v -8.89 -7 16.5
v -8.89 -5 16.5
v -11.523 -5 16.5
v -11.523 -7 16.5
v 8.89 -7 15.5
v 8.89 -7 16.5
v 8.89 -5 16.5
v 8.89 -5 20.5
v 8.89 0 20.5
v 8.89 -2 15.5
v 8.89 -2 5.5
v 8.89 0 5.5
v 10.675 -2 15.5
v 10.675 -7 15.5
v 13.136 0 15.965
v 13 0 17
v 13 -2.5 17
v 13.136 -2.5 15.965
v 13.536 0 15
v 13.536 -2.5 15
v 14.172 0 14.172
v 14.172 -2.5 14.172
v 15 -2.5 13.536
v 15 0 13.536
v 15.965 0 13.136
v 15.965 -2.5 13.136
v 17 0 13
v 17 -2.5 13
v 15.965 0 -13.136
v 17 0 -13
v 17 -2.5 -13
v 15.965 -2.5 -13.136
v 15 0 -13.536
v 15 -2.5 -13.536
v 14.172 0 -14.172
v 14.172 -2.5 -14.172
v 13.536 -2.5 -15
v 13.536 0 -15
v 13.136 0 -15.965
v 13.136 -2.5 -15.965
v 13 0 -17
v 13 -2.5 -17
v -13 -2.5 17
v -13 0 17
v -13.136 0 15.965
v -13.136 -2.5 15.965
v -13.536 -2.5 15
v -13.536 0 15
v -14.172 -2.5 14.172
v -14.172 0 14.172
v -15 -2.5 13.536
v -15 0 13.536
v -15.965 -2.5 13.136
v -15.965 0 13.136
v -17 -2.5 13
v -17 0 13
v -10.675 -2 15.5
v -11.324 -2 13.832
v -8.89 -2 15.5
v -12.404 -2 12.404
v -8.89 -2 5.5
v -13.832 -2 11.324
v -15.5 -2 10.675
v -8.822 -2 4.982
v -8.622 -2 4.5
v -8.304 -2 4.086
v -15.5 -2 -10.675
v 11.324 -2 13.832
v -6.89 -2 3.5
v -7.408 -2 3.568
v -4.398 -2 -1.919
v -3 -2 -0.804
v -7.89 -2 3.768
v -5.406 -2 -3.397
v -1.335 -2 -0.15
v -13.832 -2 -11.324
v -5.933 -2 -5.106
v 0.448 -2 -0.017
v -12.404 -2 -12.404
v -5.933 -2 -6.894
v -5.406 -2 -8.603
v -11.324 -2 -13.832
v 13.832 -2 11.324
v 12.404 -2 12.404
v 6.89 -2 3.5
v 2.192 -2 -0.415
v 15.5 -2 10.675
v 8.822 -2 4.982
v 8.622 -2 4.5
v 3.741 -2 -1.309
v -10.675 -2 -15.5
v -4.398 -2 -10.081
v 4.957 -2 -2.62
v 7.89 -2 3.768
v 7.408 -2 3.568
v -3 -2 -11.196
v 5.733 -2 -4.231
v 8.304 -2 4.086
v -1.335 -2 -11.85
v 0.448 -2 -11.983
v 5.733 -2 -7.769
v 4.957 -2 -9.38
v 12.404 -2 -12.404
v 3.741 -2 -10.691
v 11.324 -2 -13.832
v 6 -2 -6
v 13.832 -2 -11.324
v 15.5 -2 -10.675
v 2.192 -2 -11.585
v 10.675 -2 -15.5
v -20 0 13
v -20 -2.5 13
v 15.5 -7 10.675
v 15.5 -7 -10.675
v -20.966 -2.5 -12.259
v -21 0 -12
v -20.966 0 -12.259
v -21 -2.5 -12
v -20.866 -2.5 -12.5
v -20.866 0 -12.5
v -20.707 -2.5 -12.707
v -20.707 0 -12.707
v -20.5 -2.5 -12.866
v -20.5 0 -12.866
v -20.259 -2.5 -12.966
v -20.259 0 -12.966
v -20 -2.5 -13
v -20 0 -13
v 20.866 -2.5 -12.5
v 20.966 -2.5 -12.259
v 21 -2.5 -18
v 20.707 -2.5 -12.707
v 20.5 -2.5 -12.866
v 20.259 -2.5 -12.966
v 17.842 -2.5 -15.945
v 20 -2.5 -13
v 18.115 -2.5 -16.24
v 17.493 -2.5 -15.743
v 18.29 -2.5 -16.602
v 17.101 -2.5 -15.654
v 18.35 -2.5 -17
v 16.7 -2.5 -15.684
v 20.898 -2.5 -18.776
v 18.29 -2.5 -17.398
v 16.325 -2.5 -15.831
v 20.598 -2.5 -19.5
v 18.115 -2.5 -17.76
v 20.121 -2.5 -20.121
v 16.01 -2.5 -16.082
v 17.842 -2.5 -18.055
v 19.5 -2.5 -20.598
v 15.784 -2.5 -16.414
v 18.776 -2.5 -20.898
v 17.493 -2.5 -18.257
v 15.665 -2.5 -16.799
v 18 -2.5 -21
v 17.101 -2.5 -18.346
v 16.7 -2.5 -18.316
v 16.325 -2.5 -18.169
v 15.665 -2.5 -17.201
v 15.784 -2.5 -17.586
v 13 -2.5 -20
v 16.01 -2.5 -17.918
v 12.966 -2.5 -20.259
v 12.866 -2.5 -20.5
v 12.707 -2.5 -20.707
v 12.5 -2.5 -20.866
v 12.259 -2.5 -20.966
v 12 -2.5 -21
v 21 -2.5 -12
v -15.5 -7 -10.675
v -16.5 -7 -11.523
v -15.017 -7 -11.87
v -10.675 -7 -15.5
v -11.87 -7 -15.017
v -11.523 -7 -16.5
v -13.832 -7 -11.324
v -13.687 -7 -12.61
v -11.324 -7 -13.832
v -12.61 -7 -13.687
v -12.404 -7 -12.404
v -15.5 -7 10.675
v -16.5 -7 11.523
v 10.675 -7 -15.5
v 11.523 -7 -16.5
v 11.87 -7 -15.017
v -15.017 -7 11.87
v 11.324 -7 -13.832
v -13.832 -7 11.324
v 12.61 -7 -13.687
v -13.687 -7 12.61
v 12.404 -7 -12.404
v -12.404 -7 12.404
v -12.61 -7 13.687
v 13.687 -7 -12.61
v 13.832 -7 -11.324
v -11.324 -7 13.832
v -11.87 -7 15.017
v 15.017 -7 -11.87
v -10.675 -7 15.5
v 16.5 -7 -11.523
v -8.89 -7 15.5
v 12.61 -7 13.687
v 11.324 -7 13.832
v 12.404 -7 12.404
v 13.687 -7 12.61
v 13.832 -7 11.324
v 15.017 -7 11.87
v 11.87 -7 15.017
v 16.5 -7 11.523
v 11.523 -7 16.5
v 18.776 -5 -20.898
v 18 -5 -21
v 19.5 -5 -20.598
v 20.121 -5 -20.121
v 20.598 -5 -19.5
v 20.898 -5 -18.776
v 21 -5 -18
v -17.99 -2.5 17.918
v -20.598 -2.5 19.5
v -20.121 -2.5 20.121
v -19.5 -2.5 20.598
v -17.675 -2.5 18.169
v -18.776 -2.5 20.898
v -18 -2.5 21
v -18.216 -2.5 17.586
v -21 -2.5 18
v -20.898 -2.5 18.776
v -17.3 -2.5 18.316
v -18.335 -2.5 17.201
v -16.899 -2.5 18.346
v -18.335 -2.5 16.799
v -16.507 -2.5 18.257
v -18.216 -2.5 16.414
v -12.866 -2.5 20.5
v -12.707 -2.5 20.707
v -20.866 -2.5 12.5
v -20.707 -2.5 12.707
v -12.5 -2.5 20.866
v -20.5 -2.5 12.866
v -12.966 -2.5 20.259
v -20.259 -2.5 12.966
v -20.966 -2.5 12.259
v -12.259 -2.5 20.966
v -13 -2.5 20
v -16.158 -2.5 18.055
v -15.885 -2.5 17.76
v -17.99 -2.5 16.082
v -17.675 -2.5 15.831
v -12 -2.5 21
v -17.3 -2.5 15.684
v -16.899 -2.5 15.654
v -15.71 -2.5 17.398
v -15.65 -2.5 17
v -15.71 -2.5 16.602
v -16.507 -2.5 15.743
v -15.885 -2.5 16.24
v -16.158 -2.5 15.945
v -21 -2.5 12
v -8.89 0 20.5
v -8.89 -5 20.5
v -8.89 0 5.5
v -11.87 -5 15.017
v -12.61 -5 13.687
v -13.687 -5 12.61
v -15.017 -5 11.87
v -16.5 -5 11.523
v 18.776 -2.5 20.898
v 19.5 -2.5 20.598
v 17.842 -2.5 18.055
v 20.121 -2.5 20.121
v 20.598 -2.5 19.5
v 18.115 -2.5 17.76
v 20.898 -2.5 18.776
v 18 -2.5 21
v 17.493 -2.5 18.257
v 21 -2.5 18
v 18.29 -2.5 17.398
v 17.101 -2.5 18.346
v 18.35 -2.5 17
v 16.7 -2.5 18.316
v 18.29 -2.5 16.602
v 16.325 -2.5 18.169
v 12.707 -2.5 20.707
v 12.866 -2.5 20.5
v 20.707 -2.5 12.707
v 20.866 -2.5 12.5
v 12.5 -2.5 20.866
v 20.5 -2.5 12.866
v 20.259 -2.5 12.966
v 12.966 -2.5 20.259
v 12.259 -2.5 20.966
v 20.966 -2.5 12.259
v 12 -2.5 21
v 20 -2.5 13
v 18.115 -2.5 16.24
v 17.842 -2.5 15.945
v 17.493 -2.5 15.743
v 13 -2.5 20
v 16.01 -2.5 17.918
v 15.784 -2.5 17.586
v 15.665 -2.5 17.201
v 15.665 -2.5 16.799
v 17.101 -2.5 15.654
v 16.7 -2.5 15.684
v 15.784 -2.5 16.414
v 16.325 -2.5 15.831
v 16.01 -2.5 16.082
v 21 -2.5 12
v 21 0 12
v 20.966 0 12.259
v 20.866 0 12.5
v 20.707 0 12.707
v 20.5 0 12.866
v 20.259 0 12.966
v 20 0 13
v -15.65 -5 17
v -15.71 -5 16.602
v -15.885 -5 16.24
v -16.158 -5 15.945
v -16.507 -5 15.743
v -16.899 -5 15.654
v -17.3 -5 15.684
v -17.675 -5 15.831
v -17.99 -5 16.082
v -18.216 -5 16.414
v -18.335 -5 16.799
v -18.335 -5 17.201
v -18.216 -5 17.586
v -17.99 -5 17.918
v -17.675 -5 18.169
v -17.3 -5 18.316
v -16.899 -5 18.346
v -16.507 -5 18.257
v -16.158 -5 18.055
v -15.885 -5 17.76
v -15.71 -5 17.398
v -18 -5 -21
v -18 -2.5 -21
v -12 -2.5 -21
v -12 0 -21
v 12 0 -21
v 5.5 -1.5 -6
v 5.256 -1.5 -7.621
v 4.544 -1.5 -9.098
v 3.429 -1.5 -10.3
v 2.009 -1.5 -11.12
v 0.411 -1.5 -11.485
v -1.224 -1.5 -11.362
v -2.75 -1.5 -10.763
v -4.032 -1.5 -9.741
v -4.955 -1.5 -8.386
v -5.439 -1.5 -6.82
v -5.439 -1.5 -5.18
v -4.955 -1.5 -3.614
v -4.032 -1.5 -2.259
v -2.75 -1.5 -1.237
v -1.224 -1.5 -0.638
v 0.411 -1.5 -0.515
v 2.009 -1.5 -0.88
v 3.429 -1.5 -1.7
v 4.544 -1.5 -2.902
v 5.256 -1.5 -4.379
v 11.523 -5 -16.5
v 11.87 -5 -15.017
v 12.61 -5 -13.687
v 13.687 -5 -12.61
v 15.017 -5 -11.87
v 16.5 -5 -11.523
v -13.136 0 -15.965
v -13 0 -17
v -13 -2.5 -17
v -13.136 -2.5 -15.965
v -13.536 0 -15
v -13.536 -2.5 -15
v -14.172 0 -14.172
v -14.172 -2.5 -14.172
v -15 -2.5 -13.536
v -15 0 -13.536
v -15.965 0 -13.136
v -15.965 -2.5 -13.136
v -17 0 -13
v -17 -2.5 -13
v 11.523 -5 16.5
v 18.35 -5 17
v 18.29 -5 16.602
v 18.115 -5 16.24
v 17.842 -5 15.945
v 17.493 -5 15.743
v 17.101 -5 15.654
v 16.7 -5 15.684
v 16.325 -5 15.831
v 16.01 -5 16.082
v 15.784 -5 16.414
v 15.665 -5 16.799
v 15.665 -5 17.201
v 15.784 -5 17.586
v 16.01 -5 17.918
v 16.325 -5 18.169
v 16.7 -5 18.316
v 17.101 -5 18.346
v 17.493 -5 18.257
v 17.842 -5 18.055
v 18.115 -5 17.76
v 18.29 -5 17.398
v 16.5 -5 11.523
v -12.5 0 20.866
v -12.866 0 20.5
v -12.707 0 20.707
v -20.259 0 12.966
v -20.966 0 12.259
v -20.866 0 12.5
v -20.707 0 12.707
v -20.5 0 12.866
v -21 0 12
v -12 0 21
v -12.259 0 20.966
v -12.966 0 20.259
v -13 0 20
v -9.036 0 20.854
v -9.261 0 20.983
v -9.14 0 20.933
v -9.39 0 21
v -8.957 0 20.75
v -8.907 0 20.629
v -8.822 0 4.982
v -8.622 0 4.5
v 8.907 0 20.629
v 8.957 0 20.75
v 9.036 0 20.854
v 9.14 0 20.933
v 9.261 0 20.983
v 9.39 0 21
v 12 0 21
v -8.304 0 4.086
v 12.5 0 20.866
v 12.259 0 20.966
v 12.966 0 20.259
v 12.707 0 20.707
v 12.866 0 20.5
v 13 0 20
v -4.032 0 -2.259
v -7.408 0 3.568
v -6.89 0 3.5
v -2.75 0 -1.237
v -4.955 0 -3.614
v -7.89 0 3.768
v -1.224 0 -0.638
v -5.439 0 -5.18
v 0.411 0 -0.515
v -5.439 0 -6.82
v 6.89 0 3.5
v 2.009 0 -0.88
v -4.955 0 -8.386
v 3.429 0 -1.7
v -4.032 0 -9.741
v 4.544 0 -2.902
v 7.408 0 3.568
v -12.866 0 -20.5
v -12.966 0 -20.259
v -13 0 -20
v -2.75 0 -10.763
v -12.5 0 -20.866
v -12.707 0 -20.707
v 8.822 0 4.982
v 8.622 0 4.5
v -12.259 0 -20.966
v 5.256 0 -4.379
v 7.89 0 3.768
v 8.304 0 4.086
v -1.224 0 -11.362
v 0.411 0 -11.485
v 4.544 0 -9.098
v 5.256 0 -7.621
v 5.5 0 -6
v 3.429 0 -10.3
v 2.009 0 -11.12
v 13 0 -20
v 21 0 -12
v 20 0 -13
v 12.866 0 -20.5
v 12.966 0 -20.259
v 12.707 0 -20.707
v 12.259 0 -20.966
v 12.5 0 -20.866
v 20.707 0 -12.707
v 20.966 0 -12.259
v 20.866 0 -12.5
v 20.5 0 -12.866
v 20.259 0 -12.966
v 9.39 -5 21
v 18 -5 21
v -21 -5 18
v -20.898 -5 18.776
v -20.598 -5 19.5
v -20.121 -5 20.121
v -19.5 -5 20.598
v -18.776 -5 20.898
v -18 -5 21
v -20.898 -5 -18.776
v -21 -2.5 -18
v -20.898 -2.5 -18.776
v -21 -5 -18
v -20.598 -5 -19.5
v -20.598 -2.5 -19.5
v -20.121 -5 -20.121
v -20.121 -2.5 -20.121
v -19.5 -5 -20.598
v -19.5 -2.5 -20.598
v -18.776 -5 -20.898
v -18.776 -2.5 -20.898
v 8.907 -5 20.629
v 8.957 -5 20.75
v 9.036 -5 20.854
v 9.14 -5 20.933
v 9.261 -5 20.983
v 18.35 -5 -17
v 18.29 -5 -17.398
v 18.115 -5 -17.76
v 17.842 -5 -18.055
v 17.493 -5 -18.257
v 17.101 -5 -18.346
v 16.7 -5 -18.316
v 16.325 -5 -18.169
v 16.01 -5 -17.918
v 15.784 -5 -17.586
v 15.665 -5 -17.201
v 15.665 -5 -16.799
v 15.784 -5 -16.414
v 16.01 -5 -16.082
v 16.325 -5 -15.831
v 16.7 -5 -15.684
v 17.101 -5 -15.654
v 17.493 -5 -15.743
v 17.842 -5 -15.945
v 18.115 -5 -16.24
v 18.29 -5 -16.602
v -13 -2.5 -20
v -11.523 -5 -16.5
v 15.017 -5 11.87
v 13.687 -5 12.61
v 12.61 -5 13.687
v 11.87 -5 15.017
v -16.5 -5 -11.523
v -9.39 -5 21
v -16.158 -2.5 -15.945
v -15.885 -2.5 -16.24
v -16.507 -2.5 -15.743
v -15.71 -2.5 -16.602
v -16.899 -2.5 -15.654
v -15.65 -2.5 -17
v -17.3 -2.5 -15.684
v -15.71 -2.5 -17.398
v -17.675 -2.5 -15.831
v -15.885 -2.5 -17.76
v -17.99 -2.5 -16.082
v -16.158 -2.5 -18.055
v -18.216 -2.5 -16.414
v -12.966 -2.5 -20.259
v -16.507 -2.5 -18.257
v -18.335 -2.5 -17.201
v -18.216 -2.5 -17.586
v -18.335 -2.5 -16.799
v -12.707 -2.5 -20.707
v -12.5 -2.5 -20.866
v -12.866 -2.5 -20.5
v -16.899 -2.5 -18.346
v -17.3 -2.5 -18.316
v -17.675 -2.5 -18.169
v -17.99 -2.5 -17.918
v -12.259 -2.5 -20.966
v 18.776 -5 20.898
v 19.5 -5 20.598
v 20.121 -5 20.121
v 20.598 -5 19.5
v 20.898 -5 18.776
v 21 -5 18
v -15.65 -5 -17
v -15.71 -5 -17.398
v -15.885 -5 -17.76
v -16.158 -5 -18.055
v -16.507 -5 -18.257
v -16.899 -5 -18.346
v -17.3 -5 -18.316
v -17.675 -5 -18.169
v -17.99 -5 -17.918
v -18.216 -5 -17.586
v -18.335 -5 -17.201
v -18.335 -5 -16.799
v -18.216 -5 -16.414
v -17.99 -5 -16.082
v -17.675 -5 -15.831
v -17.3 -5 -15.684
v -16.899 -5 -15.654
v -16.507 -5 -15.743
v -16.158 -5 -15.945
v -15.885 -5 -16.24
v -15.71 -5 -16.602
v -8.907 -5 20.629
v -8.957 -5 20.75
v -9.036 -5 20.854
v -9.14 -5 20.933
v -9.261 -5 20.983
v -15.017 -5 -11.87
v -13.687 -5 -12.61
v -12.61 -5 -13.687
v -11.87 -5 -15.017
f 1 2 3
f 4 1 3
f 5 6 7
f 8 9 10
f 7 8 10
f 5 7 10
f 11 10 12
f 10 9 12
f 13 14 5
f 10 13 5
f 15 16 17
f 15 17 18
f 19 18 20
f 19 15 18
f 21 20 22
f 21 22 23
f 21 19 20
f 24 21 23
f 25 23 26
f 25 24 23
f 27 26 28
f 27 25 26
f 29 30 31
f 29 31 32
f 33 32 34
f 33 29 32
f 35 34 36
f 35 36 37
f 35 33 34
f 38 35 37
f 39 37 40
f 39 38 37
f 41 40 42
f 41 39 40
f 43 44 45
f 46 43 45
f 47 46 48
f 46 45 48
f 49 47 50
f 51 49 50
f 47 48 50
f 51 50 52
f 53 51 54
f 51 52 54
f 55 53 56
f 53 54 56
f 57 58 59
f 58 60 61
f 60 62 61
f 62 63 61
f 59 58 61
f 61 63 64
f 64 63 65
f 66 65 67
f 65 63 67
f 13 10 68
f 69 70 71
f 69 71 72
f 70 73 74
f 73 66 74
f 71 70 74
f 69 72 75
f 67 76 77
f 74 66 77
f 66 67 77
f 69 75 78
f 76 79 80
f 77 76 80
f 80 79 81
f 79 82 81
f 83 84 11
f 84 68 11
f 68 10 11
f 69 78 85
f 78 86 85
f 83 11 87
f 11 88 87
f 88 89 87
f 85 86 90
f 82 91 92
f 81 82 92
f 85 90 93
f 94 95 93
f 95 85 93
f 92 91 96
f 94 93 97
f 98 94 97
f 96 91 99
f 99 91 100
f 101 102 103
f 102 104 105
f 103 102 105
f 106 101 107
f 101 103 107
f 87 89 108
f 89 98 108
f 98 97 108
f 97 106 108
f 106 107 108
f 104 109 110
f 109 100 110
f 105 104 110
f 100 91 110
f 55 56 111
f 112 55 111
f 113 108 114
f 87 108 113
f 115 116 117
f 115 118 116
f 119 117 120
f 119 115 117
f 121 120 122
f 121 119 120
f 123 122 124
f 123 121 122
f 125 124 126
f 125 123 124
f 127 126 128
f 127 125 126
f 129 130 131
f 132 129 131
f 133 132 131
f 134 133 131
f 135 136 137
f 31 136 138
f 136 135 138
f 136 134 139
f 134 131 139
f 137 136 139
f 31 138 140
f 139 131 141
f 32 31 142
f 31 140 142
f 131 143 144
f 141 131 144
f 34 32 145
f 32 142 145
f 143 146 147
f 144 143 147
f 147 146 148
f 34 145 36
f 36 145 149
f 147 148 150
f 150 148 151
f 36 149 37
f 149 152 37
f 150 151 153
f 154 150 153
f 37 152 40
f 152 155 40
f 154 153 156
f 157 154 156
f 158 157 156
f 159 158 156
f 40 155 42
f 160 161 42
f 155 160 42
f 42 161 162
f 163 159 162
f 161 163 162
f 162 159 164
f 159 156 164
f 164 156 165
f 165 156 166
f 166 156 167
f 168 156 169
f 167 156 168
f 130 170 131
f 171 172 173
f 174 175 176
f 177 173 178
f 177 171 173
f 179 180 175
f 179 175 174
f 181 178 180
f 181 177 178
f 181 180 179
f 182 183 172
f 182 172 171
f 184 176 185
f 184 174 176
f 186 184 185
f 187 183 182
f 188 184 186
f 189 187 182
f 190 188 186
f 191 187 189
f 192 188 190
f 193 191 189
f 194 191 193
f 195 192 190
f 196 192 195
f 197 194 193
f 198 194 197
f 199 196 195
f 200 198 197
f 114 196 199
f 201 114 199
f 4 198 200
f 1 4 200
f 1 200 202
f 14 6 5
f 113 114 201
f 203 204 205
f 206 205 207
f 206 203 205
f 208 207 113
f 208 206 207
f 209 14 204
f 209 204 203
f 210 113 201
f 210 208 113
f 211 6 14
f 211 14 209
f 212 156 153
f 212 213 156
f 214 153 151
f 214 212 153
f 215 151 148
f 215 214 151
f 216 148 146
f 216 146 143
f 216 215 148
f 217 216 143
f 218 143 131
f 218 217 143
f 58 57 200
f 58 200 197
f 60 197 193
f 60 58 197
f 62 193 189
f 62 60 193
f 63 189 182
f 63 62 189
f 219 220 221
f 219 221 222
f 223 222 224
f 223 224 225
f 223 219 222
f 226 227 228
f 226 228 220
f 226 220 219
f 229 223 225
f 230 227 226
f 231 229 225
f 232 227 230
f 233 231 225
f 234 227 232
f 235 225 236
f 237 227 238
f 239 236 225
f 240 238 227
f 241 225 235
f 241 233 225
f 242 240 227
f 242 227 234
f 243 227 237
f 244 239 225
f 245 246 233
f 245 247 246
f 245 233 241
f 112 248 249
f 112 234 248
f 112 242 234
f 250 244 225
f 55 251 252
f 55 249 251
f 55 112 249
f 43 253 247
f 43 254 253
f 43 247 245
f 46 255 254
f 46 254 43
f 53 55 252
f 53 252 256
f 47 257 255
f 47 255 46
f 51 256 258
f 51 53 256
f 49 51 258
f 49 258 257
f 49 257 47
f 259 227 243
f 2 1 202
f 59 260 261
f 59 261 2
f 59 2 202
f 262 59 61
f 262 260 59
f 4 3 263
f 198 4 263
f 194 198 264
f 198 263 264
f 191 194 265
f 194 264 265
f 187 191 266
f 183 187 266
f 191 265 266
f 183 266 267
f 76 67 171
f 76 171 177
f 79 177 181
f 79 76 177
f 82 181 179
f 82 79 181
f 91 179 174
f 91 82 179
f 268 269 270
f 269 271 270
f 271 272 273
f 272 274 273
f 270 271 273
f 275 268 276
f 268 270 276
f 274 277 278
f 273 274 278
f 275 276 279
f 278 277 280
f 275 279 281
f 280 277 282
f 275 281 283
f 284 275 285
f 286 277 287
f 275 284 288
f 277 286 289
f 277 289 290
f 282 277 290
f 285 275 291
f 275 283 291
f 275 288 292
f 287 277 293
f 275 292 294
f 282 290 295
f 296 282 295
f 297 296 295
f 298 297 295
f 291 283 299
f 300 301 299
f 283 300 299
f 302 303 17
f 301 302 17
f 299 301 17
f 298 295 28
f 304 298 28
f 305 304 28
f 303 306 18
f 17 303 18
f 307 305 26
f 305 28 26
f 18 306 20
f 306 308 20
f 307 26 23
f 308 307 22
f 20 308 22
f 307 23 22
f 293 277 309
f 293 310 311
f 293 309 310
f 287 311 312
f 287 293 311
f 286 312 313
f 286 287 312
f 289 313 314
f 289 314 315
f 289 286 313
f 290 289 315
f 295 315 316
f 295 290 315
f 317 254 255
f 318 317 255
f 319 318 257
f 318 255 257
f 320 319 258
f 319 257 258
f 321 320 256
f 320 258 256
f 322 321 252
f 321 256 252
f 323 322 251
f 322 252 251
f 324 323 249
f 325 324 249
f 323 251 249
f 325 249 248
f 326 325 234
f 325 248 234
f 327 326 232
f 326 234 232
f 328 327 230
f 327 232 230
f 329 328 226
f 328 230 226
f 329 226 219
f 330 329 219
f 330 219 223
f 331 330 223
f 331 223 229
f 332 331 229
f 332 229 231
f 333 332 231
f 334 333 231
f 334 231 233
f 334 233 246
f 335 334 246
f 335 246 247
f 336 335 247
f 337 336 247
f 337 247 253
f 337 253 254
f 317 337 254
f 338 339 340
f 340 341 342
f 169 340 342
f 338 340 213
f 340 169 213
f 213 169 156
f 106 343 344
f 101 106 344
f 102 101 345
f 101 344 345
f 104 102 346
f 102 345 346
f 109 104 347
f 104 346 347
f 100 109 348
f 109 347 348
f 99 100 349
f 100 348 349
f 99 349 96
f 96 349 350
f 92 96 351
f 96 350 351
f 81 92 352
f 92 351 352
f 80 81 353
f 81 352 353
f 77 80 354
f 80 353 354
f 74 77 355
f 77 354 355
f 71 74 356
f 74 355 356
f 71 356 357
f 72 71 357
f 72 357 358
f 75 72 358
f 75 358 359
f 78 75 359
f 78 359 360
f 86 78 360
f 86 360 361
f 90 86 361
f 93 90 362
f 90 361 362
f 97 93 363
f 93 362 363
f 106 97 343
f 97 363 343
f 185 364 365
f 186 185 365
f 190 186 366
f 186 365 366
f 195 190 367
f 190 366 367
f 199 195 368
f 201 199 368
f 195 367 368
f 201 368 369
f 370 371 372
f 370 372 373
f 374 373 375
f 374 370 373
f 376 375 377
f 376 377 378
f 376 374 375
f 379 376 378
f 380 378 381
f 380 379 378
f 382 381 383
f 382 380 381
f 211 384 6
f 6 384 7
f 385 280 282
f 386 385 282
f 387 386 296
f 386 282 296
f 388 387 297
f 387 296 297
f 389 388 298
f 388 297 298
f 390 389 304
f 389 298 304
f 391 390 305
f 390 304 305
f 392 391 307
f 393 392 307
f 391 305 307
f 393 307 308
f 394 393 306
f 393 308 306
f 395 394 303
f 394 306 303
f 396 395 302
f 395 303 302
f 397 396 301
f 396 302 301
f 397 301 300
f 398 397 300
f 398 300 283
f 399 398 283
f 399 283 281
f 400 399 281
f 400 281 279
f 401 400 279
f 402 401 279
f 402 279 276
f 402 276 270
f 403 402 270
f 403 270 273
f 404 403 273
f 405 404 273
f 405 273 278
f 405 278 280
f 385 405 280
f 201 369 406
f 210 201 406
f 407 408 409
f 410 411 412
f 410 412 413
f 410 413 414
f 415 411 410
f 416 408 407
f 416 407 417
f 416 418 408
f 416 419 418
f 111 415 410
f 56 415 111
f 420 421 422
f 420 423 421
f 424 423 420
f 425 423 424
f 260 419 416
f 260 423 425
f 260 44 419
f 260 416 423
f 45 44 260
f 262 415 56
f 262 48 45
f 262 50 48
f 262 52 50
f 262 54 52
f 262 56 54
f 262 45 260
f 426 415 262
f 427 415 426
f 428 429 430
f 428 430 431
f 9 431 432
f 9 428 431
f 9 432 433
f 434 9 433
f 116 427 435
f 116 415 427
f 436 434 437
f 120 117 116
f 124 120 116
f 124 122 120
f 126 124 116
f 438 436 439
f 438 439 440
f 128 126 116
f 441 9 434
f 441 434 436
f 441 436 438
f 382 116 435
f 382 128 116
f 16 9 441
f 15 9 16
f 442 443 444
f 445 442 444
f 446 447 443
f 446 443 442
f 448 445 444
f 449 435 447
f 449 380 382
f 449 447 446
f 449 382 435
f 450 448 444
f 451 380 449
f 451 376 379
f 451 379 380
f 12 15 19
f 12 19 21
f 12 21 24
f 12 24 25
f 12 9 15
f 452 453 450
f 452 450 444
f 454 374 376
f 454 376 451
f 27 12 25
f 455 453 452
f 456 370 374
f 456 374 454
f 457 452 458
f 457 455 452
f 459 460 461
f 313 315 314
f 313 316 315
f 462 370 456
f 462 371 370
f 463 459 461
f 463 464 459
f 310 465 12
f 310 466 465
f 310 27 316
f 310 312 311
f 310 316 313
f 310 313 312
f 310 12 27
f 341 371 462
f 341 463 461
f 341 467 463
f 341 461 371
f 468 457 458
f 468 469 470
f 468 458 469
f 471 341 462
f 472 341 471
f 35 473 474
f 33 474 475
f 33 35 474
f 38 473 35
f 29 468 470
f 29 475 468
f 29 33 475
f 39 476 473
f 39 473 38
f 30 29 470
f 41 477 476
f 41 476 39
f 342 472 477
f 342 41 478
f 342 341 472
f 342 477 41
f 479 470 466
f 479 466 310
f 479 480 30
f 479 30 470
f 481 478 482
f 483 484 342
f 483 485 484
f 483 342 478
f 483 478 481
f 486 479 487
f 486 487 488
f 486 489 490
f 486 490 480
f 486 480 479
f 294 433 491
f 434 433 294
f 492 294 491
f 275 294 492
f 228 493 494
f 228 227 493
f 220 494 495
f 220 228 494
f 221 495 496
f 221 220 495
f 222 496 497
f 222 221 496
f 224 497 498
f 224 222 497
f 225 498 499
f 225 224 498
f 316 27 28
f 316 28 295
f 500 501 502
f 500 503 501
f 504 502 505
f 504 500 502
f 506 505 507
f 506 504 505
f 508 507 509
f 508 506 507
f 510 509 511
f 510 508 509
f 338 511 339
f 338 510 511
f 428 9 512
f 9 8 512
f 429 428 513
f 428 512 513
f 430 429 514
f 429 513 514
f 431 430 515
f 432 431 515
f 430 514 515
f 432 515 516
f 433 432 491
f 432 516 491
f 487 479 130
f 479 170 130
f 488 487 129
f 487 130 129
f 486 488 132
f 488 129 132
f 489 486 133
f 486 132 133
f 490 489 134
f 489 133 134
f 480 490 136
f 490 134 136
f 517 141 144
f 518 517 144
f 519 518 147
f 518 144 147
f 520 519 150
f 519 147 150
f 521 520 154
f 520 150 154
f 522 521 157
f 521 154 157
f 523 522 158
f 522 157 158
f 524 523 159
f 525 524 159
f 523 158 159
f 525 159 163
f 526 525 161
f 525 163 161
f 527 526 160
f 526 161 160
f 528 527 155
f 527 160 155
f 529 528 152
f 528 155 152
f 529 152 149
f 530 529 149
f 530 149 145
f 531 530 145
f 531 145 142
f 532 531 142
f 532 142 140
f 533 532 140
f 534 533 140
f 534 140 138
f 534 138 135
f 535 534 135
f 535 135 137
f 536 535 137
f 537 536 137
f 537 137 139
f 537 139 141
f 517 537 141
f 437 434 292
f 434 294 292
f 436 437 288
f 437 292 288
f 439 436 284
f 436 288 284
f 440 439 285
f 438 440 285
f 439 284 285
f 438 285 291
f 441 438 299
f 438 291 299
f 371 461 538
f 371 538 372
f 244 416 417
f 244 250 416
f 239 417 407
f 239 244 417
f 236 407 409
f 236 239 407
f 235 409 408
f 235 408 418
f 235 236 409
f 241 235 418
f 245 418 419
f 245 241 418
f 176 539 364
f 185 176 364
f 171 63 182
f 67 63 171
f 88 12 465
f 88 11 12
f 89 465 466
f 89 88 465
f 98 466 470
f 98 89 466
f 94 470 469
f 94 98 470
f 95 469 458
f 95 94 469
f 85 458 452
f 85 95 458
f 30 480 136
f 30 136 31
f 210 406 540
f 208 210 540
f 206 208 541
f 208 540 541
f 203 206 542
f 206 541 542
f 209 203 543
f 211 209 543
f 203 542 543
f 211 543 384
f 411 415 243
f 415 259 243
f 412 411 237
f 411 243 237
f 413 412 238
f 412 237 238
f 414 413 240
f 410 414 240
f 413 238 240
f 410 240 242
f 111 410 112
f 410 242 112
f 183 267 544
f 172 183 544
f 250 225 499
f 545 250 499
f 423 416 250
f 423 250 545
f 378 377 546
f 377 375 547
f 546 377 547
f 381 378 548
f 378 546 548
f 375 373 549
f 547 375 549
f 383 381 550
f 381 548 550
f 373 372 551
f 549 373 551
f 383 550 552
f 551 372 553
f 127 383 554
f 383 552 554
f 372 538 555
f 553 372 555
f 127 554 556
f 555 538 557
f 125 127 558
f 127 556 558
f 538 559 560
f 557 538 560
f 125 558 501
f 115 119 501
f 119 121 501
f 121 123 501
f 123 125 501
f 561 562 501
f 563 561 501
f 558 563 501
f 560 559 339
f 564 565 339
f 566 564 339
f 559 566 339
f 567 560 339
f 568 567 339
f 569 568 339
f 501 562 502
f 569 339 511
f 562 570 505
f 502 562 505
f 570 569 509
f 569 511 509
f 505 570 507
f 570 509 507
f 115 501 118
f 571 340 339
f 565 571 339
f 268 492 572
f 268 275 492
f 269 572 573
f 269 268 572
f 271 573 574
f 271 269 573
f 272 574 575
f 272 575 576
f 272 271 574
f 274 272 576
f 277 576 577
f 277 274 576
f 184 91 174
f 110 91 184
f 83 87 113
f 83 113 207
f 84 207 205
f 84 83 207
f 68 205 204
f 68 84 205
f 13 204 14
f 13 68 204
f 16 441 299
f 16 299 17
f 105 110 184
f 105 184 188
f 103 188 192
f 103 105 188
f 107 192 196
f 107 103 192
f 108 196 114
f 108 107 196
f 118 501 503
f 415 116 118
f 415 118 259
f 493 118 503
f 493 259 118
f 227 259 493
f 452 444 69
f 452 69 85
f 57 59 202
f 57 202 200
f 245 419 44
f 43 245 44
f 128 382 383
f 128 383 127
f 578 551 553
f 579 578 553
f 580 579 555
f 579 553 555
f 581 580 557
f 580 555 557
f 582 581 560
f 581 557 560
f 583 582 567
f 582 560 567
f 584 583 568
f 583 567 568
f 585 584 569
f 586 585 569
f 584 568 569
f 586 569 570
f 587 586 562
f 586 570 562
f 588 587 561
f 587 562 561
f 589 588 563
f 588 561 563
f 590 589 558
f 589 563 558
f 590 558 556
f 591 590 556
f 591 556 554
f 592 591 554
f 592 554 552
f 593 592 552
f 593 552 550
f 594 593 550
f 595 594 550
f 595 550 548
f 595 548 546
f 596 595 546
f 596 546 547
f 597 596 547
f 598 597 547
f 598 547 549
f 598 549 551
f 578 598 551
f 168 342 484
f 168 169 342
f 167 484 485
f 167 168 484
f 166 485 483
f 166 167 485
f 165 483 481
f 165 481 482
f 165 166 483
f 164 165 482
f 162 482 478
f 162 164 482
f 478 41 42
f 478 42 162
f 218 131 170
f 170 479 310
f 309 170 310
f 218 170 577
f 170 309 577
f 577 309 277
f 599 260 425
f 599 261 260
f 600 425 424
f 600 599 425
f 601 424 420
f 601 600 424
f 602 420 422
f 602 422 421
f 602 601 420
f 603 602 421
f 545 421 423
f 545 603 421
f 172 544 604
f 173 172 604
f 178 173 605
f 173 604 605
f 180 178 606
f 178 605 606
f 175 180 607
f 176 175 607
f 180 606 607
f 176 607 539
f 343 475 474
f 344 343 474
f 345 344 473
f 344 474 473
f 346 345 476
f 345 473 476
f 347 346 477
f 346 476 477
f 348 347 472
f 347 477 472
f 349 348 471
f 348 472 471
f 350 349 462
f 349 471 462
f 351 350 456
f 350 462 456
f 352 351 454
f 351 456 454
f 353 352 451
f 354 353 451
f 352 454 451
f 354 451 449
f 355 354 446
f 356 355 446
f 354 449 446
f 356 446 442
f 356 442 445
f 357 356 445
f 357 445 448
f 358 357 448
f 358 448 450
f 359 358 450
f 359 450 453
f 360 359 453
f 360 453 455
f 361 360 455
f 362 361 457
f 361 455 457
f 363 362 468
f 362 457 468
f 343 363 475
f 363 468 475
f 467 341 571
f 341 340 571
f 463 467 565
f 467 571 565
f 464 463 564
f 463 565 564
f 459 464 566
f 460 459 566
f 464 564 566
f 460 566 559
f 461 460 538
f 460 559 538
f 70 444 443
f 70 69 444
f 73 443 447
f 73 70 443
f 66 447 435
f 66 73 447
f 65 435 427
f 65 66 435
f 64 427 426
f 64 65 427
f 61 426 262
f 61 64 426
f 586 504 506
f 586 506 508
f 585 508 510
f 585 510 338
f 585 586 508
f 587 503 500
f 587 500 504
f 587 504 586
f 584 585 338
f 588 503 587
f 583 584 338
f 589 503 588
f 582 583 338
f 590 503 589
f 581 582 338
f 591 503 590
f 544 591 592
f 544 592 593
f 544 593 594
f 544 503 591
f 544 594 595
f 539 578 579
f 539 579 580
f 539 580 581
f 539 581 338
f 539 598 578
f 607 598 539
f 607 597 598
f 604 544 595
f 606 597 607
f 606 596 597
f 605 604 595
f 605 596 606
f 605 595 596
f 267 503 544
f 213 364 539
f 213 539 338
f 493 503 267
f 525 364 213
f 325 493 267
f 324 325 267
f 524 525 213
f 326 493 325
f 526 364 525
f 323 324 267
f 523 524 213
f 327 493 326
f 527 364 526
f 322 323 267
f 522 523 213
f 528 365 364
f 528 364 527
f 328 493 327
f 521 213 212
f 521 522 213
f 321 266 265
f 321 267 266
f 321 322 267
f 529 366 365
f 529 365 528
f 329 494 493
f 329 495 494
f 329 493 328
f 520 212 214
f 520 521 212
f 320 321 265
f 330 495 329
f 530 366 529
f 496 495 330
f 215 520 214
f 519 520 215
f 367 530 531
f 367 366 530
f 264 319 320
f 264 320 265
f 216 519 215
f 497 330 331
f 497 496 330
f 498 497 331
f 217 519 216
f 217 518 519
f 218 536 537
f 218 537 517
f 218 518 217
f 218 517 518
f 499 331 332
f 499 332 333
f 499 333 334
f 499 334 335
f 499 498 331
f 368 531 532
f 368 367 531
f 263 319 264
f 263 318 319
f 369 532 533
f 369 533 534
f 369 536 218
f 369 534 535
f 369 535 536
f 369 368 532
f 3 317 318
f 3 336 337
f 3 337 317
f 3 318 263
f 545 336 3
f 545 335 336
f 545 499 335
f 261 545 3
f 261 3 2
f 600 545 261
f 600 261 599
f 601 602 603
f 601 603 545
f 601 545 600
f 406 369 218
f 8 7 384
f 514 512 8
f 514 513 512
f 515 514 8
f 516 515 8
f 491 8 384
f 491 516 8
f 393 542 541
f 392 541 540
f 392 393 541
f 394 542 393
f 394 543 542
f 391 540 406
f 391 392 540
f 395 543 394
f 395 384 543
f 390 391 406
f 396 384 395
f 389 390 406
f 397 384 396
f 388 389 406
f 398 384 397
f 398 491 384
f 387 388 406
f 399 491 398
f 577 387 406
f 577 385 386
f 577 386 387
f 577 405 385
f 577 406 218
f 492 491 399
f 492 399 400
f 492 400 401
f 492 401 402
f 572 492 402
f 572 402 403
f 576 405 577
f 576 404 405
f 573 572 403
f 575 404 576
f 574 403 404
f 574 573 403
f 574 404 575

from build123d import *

# Parameters (mm, degrees)
SKETCH2_W           = 42
SKETCH2_H           = 42
SKETCH2_R           = 5.5
BOSS_EXTRUDE1_DEPTH = 2
SKETCH4_W           = 42
SKETCH4_H           = 42
BOSS_EXTRUDE2_DEPTH = 3
BOSS_EXTRUDE3_DEPTH = 3
BOSS_EXTRUDE5_DEPTH = 5
CUT_EXTRUDE1_DEPTH  = 2.5
SKETCH9_R           = 1.35
CUT_EXTRUDE2_DEPTH  = 8
FILLET1_R           = 3
FILLET2_R           = 1
CHAMFER1_SIZE       = 0.5
SKETCH11_W          = 17.78
SKETCH11_H          = 17.5
CUT_EXTRUDE3_DEPTH  = 7
FILLET3_R           = 2
FILLET4_R           = 0.5


with BuildPart() as part:
    # Sketch2 → Boss-Extrude1 (new body)
    with BuildSketch(Plane(origin=(0, 0, 0), x_dir=(1, 0, 0), z_dir=(0, 1, 0))):
        Rectangle(SKETCH2_W, SKETCH2_H)
        with Locations((0, 6)):
            Circle(SKETCH2_R, mode=Mode.SUBTRACT)
    extrude(amount=-BOSS_EXTRUDE1_DEPTH)

    # Sketch4 → Boss-Extrude2 (add)
    with BuildSketch(Plane.XZ.offset(2)):
        Rectangle(SKETCH4_W, SKETCH4_H)
        with BuildLine():
            Line((-17, 11.522774425), (-17, -11.522774425))
            ThreePointArc((-17, -11.522774425), (-16.869274473, -11.859874356), (-16.545454545, -12.020704023))
            ThreePointArc((-16.545454545, -12.020704023), (-13.464466094, -13.464466094), (-12.020704023, -16.545454545))
            ThreePointArc((-12.020704023, -16.545454545), (-11.859874356, -16.869274473), (-11.522774425, -17))
            Line((-11.522774425, -17), (11.522774425, -17))
            ThreePointArc((11.522774425, -17), (11.859874356, -16.869274473), (12.020704023, -16.545454545))
            ThreePointArc((12.020704023, -16.545454545), (13.464466094, -13.464466094), (16.545454545, -12.020704023))
            ThreePointArc((16.545454545, -12.020704023), (16.869274473, -11.859874356), (17, -11.522774425))
            Line((17, -11.522774425), (17, 11.522774425))
            ThreePointArc((17, 11.522774425), (16.869274473, 11.859874356), (16.545454545, 12.020704023))
            ThreePointArc((16.545454545, 12.020704023), (13.464466094, 13.464466094), (12.020704023, 16.545454545))
            ThreePointArc((12.020704023, 16.545454545), (11.859874356, 16.869274473), (11.522774425, 17))
            Line((11.522774425, 17), (-11.522774425, 17))
            ThreePointArc((-11.522774425, 17), (-11.859874356, 16.869274473), (-12.020704023, 16.545454545))
            ThreePointArc((-12.020704023, 16.545454545), (-13.464466094, 13.464466094), (-16.545454545, 12.020704023))
            ThreePointArc((-16.545454545, 12.020704023), (-16.869274473, 11.859874356), (-17, 11.522774425))
        make_face(mode=Mode.SUBTRACT)
    extrude(amount=BOSS_EXTRUDE2_DEPTH)

    # Sketch6 → Boss-Extrude3 (add)
    with BuildSketch(Plane.XZ.offset(2)):
        with BuildLine():
            Line((-17, 11.522774425), (-17, -11.522774425))
            ThreePointArc((-17, -11.522774425), (-16.869274473, -11.859874356), (-16.545454545, -12.020704023))
            ThreePointArc((-16.545454545, -12.020704023), (-13.464466094, -13.464466094), (-12.020704023, -16.545454545))
            ThreePointArc((-12.020704023, -16.545454545), (-11.859874356, -16.869274473), (-11.522774425, -17))
            Line((-11.522774425, -17), (11.522774425, -17))
            ThreePointArc((11.522774425, -17), (11.859874356, -16.869274473), (12.020704023, -16.545454545))
            ThreePointArc((12.020704023, -16.545454545), (13.464466094, -13.464466094), (16.545454545, -12.020704023))
            ThreePointArc((16.545454545, -12.020704023), (16.869274473, -11.859874356), (17, -11.522774425))
            Line((17, -11.522774425), (17, 11.522774425))
            ThreePointArc((17, 11.522774425), (16.869274473, 11.859874356), (16.545454545, 12.020704023))
            ThreePointArc((16.545454545, 12.020704023), (13.464466094, 13.464466094), (12.020704023, 16.545454545))
            ThreePointArc((12.020704023, 16.545454545), (11.859874356, 16.869274473), (11.522774425, 17))
            Line((11.522774425, 17), (-11.522774425, 17))
            ThreePointArc((-11.522774425, 17), (-11.859874356, 16.869274473), (-12.020704023, 16.545454545))
            ThreePointArc((-12.020704023, 16.545454545), (-13.464466094, 13.464466094), (-16.545454545, 12.020704023))
            ThreePointArc((-16.545454545, 12.020704023), (-16.869274473, 11.859874356), (-17, 11.522774425))
        make_face()
        with BuildLine():
            Line((-16.5, 11.522774425), (-16.5, -11.522774425))
            ThreePointArc((-16.5, -11.522774425), (-13.110912703, -13.110912703), (-11.522774425, -16.5))
            Line((-11.522774425, -16.5), (11.522774425, -16.5))
            ThreePointArc((11.522774425, -16.5), (13.110912703, -13.110912703), (16.5, -11.522774425))
            Line((16.5, -11.522774425), (16.5, 11.522774425))
            ThreePointArc((16.5, 11.522774425), (13.110912703, 13.110912703), (11.522774425, 16.5))
            Line((11.522774425, 16.5), (-11.522774425, 16.5))
            ThreePointArc((-11.522774425, 16.5), (-13.110912703, 13.110912703), (-16.5, 11.522774425))
        make_face(mode=Mode.SUBTRACT)
    extrude(amount=BOSS_EXTRUDE3_DEPTH)

    # Sketch7 → Boss-Extrude5 (add)
    with BuildSketch(Plane.XZ.offset(2)):
        with BuildLine():
            Line((11.522774425, 16.5), (-11.522774425, 16.5))
            ThreePointArc((-11.522774425, 16.5), (-13.110912703, 13.110912703), (-16.5, 11.522774425))
            Line((-16.5, 11.522774425), (-16.5, -11.522774425))
            ThreePointArc((-16.5, -11.522774425), (-13.110912703, -13.110912703), (-11.522774425, -16.5))
            Line((-11.522774425, -16.5), (11.522774425, -16.5))
            ThreePointArc((11.522774425, -16.5), (13.110912703, -13.110912703), (16.5, -11.522774425))
            Line((16.5, -11.522774425), (16.5, 11.522774425))
            ThreePointArc((16.5, 11.522774425), (13.110912703, 13.110912703), (11.522774425, 16.5))
        make_face()
        with BuildLine():
            Line((10.67544468, 15.5), (-10.67544468, 15.5))
            ThreePointArc((-10.67544468, 15.5), (-12.403805922, 12.403805922), (-15.5, 10.67544468))
            Line((-15.5, 10.67544468), (-15.5, -10.67544468))
            ThreePointArc((-15.5, -10.67544468), (-12.403805922, -12.403805922), (-10.67544468, -15.5))
            Line((-10.67544468, -15.5), (10.67544468, -15.5))
            ThreePointArc((10.67544468, -15.5), (12.403805922, -12.403805922), (15.5, -10.67544468))
            Line((15.5, -10.67544468), (15.5, 10.67544468))
            ThreePointArc((15.5, 10.67544468), (12.403805922, 12.403805922), (10.67544468, 15.5))
        make_face(mode=Mode.SUBTRACT)
    extrude(amount=BOSS_EXTRUDE5_DEPTH)

    # Sketch8 → Cut-Extrude1 (cut)
    with BuildSketch(Plane(origin=(0, 0, 0), x_dir=(1, 0, 0), z_dir=(0, 1, 0))):
        with BuildLine():
            Line((-17, 13), (-21, 13))
            Line((-21, 13), (-21, 21))
            Line((-21, 21), (-13, 21))
            Line((-13, 21), (-13, 17))
            ThreePointArc((-13, 17), (-14.171572875, 14.171572875), (-17, 13))
        make_face()
        with BuildLine():
            Line((13, 17), (13, 21))
            Line((13, 21), (21, 21))
            Line((21, 21), (21, 13))
            Line((21, 13), (17, 13))
            ThreePointArc((17, 13), (14.171572875, 14.171572875), (13, 17))
        make_face()
        with BuildLine():
            Line((-21, -17), (-21, -21))
            Line((-21, -21), (-17, -21))
            Line((-17, -21), (-13, -21))
            Line((-13, -21), (-13, -17))
            ThreePointArc((-13, -17), (-14.171572875, -14.171572875), (-17, -13))
            Line((-17, -13), (-21, -13))
            Line((-21, -13), (-21, -17))
        make_face()
        with BuildLine():
            Line((17, -13), (21, -13))
            Line((21, -13), (21, -21))
            Line((21, -21), (17, -21))
            Line((17, -21), (13, -21))
            Line((13, -21), (13, -17))
            ThreePointArc((13, -17), (14.171572875, -14.171572875), (17, -13))
        make_face()
    extrude(amount=-CUT_EXTRUDE1_DEPTH, mode=Mode.SUBTRACT)

    # Sketch9 → Cut-Extrude2 (cut, through all)
    with BuildSketch(Plane(origin=(0, 0, 0), x_dir=(1, 0, 0), z_dir=(0, 1, 0))):
        with Locations((-17, 17)):
            Circle(SKETCH9_R)
        with Locations((17, 17)):
            Circle(SKETCH9_R)
        with Locations((-17, -17)):
            Circle(SKETCH9_R)
        with Locations((17, -17)):
            Circle(SKETCH9_R)
    extrude(amount=-CUT_EXTRUDE2_DEPTH, mode=Mode.SUBTRACT)

    # Fillet1
    fillet1_edges = [part.edges().sort_by_distance(p)[0] for p in [
        (21, -3.75, 21),
        (-21, -3.75, 21),
        (-21, -3.75, -21),
        (21, -3.75, -21),
    ]]
    fillet(fillet1_edges, radius=FILLET1_R)

    # Fillet2
    fillet2_edges = [part.edges().sort_by_distance(p)[0] for p in [
        (13, -1.25, -21),
        (21, -1.25, -13),
        (-21, -1.25, 13),
        (-13, -1.25, 21),
        (21, -1.25, 13),
        (13, -1.25, 21),
        (-21, -1.25, -13),
        (-13, -1.25, -21),
    ]]
    fillet(fillet2_edges, radius=FILLET2_R)

    # Chamfer1
    chamfer1_edges = [part.edges().sort_by_distance(p)[0] for p in [
        (-5.5, -2, -6),
    ]]
    chamfer(chamfer1_edges, length=CHAMFER1_SIZE)

    # Sketch11 → Cut-Extrude3 (cut)
    with BuildSketch(Plane(origin=(0, 0, 0), x_dir=(1, 0, 0), z_dir=(0, 1, 0))):
        with Locations((0, -12.25)):
            Rectangle(SKETCH11_W, SKETCH11_H)
    extrude(amount=-CUT_EXTRUDE3_DEPTH, mode=Mode.SUBTRACT)

    # Fillet3
    fillet3_edges = [part.edges().sort_by_distance(p)[0] for p in [
        (-8.89, -1, 3.5),
        (8.89, -1, 3.5),
    ]]
    fillet(fillet3_edges, radius=FILLET3_R)

    # Fillet4
    fillet4_edges = [part.edges().sort_by_distance(p)[0] for p in [
        (-8.89, -2.5, 21),
        (8.89, -2.5, 21),
    ]]
    fillet(fillet4_edges, radius=FILLET4_R)


solid = part.part
